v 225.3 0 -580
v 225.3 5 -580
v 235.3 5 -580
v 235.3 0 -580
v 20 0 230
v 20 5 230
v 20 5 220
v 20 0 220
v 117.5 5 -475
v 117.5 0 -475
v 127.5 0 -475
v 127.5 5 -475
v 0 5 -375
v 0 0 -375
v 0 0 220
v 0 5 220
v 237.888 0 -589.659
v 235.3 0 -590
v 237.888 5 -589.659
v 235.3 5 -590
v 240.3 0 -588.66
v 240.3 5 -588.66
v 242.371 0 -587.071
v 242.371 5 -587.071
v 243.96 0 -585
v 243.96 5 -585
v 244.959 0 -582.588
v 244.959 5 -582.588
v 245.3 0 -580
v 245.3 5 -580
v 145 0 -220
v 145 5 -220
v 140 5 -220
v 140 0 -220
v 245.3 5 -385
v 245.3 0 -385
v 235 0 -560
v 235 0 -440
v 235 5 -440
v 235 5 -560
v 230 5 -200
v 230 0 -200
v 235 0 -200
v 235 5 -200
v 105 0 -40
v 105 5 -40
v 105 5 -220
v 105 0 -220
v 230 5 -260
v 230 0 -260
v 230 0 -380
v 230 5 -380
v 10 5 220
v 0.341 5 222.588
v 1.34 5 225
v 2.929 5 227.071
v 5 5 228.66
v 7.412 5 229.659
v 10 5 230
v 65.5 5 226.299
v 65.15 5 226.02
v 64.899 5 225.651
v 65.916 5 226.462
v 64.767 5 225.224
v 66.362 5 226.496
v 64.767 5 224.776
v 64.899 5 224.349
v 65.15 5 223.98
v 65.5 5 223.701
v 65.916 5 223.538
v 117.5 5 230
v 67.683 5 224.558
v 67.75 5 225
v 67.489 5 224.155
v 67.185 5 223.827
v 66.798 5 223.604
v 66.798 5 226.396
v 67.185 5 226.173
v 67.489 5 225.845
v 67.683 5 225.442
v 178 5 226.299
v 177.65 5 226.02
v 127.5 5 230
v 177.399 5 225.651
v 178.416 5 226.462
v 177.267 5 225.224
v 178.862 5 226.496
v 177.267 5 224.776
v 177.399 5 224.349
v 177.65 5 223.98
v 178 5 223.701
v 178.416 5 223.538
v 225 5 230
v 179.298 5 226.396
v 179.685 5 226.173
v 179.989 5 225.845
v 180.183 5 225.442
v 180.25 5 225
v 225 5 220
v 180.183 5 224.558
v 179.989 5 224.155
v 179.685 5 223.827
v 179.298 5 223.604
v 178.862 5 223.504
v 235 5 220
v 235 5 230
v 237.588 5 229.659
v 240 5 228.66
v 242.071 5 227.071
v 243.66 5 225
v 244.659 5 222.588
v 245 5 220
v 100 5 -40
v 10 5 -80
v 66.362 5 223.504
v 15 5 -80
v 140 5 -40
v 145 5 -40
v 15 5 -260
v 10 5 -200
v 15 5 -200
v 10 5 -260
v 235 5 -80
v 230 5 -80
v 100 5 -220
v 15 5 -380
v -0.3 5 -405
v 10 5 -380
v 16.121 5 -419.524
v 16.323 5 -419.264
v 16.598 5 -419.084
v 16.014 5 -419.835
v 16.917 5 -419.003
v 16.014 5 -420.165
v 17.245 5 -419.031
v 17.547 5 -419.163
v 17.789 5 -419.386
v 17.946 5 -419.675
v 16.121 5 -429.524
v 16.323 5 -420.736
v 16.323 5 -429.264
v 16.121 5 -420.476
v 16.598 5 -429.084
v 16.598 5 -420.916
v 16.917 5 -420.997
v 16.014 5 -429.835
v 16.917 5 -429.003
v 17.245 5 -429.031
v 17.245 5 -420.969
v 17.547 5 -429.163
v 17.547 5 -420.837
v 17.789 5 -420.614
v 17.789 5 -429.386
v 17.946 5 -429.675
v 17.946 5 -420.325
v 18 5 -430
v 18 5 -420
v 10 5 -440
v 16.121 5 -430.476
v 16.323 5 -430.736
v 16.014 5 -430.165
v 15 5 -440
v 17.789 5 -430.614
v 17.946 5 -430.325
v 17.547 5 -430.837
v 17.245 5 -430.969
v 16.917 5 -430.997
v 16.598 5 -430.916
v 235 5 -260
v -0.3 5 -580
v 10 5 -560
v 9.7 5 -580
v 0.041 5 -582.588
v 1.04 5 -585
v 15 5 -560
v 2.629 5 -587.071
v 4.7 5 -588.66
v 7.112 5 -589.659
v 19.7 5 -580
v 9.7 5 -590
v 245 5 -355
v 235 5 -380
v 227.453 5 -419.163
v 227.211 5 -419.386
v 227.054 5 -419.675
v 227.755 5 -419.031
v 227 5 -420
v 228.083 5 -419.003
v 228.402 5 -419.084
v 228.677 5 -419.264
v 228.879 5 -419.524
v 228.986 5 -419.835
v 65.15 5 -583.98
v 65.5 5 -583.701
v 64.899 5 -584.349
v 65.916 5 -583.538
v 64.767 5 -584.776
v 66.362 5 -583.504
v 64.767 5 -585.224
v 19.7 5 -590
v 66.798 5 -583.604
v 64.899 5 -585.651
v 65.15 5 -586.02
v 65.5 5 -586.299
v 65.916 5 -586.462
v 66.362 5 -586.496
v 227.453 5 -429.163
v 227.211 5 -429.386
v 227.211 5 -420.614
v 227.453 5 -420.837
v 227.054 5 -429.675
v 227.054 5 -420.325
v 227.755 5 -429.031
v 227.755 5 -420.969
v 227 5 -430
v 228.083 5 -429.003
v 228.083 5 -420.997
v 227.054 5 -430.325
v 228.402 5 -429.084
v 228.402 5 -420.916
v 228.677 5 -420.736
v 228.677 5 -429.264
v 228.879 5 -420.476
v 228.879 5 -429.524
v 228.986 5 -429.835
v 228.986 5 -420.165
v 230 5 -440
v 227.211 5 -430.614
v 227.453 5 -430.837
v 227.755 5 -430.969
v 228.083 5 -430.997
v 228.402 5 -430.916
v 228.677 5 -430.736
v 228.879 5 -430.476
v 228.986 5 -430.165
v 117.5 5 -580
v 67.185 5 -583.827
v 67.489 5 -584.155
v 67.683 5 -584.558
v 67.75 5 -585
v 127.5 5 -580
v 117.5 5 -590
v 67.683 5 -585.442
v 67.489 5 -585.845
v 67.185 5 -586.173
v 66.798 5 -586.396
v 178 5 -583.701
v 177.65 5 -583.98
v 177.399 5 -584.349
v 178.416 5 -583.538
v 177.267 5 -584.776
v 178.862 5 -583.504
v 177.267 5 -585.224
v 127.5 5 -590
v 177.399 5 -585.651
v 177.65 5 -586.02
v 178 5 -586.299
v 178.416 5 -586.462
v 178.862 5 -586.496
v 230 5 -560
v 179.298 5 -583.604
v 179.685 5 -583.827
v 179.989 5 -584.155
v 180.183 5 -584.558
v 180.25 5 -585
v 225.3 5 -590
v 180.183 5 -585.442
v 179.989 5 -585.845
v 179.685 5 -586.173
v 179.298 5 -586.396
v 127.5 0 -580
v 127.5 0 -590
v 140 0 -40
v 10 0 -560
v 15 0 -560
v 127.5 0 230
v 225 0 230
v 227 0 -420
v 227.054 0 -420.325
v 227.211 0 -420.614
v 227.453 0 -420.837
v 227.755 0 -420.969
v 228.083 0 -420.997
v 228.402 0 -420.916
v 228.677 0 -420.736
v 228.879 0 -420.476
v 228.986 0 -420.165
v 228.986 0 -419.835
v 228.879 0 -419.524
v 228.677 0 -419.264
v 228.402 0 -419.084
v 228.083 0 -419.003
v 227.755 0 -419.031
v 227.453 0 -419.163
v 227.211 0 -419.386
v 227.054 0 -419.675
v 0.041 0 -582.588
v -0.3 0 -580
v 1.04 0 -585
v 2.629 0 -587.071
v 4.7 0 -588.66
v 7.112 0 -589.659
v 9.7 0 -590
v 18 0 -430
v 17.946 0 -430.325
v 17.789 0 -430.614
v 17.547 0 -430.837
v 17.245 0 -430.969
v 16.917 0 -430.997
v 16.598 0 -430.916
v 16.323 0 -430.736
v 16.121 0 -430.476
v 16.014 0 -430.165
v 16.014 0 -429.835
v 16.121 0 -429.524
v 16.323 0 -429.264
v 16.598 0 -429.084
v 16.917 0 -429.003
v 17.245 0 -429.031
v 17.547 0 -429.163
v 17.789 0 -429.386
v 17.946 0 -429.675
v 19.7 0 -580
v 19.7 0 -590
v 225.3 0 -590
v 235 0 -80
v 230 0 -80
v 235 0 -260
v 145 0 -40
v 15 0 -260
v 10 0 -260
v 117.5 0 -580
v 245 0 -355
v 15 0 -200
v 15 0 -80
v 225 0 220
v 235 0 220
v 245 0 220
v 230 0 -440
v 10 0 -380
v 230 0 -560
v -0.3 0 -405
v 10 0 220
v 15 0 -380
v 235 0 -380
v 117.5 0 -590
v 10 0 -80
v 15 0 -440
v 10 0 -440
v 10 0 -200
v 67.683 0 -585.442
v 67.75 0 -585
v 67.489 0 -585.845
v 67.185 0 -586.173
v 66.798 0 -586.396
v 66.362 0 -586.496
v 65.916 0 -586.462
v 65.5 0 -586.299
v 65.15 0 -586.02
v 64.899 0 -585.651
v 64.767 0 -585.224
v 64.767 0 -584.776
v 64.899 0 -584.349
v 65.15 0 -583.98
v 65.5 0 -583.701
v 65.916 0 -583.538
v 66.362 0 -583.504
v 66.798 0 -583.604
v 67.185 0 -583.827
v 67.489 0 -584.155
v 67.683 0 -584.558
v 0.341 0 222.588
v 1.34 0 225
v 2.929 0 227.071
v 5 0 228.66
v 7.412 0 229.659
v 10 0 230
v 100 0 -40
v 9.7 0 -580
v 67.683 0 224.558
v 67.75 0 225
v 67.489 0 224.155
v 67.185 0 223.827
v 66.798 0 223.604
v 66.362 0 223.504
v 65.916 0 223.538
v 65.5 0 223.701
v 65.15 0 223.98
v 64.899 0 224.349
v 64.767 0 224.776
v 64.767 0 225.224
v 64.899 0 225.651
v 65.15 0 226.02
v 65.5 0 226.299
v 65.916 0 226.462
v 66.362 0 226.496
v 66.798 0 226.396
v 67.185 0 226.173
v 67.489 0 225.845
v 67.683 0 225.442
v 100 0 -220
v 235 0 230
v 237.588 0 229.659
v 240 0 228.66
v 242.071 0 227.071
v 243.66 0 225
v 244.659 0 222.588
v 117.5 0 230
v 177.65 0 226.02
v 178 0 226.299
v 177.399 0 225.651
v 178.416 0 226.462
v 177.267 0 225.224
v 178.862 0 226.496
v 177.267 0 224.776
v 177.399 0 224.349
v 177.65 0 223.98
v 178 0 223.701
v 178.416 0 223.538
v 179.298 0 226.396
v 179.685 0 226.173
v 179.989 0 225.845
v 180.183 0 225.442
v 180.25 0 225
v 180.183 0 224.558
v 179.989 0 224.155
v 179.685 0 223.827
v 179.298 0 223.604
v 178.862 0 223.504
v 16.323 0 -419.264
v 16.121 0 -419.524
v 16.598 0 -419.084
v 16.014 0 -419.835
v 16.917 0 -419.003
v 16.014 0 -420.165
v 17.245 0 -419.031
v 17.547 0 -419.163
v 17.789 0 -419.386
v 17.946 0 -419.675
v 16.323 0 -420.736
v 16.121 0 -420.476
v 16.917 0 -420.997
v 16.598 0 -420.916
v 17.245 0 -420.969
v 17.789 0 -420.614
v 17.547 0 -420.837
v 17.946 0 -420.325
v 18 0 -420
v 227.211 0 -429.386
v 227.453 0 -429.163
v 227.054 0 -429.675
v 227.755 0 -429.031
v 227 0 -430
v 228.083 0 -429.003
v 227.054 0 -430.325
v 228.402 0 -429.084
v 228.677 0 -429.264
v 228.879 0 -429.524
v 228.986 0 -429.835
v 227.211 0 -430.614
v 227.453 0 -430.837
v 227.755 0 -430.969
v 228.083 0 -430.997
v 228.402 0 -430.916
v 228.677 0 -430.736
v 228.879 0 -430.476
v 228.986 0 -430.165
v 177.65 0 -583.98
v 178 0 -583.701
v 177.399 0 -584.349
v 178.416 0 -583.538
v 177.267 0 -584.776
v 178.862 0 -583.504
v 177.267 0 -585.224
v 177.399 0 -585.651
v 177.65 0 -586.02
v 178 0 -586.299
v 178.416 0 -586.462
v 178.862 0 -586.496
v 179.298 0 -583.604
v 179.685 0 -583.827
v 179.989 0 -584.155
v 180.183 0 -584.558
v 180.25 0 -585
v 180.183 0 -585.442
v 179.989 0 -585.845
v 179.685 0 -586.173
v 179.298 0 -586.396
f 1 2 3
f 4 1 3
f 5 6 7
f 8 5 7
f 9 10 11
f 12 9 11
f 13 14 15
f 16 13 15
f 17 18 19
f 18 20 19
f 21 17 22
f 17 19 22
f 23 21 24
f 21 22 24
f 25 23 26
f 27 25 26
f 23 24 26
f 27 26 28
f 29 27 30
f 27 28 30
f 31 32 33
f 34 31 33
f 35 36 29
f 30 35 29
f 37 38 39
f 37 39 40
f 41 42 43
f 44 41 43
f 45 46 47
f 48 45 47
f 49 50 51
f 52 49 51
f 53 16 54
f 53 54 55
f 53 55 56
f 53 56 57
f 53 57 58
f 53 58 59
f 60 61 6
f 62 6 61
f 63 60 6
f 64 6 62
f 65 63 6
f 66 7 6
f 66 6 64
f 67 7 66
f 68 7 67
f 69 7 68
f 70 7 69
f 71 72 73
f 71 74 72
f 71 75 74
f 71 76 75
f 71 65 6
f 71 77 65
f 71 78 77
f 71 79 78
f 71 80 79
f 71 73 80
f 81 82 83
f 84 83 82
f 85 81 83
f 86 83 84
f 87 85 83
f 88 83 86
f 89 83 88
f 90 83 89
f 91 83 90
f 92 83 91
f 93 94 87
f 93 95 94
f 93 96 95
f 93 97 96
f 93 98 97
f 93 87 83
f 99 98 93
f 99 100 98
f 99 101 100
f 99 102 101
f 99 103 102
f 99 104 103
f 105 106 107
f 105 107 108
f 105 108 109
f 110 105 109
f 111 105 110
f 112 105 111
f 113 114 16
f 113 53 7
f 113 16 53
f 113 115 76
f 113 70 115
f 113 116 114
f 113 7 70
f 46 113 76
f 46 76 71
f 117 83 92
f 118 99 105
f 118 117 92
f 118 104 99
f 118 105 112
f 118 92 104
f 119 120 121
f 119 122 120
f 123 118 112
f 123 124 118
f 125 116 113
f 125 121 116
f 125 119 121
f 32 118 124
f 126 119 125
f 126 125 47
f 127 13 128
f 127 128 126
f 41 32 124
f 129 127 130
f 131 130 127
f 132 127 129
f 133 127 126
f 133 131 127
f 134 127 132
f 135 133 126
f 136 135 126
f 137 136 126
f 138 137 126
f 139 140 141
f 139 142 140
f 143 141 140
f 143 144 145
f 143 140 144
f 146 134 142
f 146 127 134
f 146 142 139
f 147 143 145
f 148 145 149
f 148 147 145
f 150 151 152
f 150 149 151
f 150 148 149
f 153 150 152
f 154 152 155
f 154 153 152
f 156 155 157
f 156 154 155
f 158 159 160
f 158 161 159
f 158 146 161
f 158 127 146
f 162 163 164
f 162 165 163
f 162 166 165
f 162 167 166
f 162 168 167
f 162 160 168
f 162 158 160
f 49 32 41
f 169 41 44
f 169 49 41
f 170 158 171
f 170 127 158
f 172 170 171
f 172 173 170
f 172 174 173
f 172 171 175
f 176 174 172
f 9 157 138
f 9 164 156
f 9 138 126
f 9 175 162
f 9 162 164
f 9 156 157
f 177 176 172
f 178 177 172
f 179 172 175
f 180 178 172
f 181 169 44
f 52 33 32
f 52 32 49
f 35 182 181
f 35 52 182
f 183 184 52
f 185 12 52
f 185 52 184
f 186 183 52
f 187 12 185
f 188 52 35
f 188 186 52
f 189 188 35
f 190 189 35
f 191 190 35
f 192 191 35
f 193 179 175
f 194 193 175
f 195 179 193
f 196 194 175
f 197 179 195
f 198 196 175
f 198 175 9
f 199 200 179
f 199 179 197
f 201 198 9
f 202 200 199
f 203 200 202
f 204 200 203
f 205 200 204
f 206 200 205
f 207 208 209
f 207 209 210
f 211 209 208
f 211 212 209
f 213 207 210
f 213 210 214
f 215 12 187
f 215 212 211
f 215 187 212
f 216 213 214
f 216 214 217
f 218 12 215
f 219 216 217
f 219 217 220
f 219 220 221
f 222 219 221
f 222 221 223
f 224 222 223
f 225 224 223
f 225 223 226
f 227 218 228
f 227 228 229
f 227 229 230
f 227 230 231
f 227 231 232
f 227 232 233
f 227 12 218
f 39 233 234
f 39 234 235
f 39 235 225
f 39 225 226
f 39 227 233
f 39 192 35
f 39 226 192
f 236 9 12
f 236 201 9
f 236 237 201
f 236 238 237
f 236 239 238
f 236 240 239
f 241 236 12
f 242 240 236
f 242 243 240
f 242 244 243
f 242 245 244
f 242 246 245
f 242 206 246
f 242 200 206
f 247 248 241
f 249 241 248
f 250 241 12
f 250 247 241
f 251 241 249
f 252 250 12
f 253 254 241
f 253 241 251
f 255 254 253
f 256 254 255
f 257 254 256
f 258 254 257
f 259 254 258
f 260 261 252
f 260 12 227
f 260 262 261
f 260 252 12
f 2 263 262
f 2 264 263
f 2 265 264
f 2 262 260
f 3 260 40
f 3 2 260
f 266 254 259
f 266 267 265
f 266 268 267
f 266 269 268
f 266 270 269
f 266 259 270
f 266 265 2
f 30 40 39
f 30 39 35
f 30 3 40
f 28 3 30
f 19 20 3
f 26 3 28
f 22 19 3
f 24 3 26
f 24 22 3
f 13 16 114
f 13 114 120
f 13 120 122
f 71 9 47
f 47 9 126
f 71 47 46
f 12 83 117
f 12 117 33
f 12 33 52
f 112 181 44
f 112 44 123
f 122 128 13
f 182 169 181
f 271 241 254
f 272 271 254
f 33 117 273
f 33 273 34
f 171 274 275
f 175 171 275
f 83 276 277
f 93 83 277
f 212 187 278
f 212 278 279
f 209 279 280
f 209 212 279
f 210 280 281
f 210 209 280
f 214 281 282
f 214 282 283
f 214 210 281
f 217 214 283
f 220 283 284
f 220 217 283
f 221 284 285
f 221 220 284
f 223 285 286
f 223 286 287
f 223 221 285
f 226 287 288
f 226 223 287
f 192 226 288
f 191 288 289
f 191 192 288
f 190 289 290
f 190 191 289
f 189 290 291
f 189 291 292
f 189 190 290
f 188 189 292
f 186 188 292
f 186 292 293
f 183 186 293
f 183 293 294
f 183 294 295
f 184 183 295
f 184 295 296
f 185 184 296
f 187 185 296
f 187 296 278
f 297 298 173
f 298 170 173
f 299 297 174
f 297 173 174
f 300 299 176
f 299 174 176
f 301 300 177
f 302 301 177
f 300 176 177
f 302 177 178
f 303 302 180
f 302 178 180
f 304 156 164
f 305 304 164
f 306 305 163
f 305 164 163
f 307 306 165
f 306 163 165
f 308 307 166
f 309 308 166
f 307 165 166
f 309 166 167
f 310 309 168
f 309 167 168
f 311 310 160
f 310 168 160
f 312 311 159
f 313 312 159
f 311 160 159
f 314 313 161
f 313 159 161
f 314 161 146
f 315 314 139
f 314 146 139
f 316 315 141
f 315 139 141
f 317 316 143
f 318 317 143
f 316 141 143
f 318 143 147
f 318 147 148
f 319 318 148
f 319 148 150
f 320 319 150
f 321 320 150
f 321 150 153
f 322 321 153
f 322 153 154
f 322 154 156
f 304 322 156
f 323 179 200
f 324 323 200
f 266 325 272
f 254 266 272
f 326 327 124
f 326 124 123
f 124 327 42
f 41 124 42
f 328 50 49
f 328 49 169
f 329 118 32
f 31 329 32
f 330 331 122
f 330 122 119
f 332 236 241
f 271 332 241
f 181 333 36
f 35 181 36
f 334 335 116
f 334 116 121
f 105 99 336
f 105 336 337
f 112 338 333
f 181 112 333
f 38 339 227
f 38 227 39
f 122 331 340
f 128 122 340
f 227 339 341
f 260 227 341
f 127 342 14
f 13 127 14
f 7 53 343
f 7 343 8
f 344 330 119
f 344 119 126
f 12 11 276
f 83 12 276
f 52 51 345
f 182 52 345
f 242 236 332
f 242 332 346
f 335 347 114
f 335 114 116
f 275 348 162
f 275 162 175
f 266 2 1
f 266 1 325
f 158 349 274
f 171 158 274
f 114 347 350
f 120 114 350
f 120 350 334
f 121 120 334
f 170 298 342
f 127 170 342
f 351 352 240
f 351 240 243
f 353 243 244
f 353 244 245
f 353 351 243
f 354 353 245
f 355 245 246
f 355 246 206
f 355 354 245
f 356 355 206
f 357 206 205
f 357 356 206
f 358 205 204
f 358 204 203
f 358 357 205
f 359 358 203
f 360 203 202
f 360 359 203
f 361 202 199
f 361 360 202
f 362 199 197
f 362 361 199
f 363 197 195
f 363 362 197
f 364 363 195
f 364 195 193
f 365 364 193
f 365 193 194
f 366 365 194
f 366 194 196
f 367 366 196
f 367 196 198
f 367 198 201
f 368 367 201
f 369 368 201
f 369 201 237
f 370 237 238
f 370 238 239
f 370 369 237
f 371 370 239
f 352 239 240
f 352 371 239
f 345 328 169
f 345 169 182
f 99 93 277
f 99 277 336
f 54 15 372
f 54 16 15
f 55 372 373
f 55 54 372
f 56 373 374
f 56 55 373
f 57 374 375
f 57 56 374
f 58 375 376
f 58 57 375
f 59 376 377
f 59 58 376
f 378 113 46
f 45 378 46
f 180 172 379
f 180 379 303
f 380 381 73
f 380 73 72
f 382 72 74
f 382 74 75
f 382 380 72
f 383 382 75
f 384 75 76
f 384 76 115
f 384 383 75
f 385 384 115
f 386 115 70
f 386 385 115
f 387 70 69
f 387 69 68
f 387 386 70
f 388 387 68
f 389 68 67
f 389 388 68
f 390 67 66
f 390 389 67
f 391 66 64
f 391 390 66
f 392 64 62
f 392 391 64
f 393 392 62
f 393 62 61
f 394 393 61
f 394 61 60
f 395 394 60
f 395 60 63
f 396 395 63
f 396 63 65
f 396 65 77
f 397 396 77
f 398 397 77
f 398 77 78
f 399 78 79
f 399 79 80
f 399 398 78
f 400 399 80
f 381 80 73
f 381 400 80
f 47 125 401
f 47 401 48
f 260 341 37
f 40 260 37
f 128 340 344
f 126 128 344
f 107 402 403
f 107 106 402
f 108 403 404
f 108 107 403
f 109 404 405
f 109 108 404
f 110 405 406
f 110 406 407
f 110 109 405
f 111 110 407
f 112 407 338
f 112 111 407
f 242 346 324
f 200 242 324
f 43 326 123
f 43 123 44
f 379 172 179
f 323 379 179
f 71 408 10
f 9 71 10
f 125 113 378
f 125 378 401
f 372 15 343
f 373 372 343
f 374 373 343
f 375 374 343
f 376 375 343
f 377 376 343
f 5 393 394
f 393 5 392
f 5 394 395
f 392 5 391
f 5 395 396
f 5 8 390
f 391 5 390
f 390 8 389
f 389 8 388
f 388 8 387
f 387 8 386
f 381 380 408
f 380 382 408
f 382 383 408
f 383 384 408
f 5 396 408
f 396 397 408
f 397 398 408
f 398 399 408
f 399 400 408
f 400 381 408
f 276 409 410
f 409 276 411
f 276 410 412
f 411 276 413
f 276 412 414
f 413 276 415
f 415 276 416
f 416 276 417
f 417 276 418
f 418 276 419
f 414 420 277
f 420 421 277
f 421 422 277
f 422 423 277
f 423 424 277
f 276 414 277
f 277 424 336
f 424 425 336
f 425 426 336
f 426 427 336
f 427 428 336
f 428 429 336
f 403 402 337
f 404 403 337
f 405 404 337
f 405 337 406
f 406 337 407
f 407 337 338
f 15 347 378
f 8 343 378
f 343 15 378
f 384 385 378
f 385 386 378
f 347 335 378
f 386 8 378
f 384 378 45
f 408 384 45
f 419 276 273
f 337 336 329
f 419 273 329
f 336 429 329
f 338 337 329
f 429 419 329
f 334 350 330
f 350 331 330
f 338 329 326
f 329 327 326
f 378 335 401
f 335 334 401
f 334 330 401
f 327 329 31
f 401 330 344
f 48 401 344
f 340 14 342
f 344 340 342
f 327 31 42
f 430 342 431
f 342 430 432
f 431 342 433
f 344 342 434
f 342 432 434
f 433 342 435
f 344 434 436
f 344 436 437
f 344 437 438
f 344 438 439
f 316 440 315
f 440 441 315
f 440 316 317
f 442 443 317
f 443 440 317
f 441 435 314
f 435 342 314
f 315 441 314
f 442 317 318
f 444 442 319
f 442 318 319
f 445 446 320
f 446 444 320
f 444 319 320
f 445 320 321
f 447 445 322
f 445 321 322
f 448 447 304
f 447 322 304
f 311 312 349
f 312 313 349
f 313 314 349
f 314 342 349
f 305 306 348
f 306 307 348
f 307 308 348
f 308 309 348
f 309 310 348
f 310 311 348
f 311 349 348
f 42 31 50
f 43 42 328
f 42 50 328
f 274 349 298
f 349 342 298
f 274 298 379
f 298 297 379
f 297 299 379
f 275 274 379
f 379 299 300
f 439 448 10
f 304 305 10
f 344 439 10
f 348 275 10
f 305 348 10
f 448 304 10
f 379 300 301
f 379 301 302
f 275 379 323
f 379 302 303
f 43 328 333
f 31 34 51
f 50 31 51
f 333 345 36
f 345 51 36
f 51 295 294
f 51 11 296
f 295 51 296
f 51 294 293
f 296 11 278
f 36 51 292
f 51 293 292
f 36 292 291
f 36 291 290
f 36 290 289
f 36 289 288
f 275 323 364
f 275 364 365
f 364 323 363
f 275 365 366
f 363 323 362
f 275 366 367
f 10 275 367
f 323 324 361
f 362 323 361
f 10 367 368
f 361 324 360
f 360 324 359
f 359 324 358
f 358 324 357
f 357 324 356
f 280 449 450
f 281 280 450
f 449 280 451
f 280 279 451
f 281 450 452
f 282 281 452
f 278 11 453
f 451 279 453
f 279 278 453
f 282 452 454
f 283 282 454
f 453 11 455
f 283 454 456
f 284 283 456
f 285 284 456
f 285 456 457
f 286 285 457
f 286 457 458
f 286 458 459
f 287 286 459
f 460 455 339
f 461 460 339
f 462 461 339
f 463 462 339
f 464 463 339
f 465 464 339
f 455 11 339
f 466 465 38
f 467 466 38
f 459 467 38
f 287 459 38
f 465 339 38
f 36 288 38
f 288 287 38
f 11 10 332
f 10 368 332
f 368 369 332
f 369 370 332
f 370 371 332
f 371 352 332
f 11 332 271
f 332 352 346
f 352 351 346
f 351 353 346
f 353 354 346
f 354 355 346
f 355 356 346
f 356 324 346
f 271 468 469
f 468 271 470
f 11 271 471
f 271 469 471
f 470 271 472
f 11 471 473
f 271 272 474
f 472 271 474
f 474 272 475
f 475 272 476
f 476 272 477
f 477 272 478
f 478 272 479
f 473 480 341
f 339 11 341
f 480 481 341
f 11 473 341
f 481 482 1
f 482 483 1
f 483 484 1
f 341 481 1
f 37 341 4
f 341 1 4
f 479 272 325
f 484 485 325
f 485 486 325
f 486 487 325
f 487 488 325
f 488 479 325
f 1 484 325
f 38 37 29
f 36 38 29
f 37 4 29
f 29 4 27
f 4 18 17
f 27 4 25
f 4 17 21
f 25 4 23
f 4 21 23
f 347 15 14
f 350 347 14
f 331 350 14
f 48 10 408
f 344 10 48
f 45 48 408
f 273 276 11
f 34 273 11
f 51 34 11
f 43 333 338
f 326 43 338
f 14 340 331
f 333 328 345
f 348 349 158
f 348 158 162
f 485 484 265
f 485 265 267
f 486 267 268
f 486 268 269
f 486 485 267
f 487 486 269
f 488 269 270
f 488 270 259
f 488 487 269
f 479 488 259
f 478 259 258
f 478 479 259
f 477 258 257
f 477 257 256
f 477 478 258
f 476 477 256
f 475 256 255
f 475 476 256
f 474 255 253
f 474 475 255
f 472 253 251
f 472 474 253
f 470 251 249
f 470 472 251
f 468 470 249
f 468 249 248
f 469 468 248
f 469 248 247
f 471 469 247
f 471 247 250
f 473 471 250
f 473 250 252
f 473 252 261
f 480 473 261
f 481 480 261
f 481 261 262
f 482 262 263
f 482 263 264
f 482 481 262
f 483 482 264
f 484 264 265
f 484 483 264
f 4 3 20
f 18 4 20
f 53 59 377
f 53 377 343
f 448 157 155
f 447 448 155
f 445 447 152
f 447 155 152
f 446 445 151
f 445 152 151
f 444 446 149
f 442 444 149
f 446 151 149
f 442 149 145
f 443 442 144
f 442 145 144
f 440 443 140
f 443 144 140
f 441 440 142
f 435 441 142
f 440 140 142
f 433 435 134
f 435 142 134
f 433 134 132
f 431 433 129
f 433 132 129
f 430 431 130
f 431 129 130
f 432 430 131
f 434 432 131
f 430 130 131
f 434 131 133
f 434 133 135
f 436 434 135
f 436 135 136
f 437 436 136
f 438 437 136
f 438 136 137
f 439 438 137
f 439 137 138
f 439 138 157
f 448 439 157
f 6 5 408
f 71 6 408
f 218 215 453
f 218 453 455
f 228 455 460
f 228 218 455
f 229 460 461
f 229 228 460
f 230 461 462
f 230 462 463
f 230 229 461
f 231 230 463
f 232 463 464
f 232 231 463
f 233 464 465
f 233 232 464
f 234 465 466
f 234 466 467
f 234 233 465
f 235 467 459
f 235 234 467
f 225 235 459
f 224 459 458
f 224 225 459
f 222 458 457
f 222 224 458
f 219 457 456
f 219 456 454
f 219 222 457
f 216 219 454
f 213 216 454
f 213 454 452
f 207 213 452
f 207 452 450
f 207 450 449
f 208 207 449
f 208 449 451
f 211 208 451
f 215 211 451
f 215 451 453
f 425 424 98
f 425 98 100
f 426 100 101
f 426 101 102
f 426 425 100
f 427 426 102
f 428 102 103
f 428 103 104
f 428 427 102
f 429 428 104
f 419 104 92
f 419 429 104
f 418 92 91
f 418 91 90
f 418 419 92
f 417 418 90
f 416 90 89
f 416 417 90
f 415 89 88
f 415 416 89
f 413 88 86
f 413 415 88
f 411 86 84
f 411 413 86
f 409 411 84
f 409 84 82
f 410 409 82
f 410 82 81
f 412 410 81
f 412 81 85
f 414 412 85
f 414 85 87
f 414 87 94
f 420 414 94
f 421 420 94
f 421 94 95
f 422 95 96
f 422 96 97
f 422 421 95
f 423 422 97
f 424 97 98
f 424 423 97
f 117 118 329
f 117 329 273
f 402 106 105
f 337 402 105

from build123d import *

# Parameters (mm, degrees)
SKETCH2_R           = 1.5
SKETCH2_W           = 5
SKETCH2_H           = 120
BOSS_EXTRUDE1_DEPTH = 5
SKETCH3_R           = 1
SKETCH3_W           = 5
SKETCH3_H           = 180
CUT_EXTRUDE1_DEPTH  = 5
FILLET1_R           = 10
SKETCH4_W           = 10
SKETCH4_H           = 10
CUT_EXTRUDE2_DEPTH  = 10


with BuildPart() as part:
    # Sketch2 → Boss-Extrude1 (new body)
    with BuildSketch(Plane(origin=(0, 0, 0), x_dir=(1, 0, 0), z_dir=(0, 1, 0))):
        Polygon((0, 375), (0, 0), (0, -230), (10, -230), (15, -230), (117.5, -230), (117.5, 475), (127.5, 475), (127.5, -230), (230, -230), (235, -230), (245, -230), (245, -10), (245, 355), (245.3, 385), (245.3, 590), (245, 590), (0, 590), (-0.3, 590), (-0.3, 405), align=None)
        with Locations((66.25, -225)):
            Circle(SKETCH2_R, mode=Mode.SUBTRACT)
        with Locations((12.5, 140)):
            Rectangle(SKETCH2_W, SKETCH2_H, mode=Mode.SUBTRACT)
        with Locations((178.75, -225)):
            Circle(SKETCH2_R, mode=Mode.SUBTRACT)
        with Locations((232.5, 140)):
            Rectangle(SKETCH2_W, SKETCH2_H, mode=Mode.SUBTRACT)
        with Locations((12.5, 320)):
            Rectangle(SKETCH2_W, SKETCH2_H, mode=Mode.SUBTRACT)
        with Locations((12.5, 500)):
            Rectangle(SKETCH2_W, SKETCH2_H, mode=Mode.SUBTRACT)
        with Locations((66.25, 585)):
            Circle(SKETCH2_R, mode=Mode.SUBTRACT)
        with Locations((232.5, 320)):
            Rectangle(SKETCH2_W, SKETCH2_H, mode=Mode.SUBTRACT)
        with Locations((178.75, 585)):
            Circle(SKETCH2_R, mode=Mode.SUBTRACT)
        with Locations((232.5, 500)):
            Rectangle(SKETCH2_W, SKETCH2_H, mode=Mode.SUBTRACT)
    extrude(amount=BOSS_EXTRUDE1_DEPTH)

    # Sketch3 → Cut-Extrude1 (cut)
    with BuildSketch(Plane(origin=(0, 5, 0), x_dir=(1, 0, 0), z_dir=(0, 1, 0))):
        with Locations((17, 420)):
            Circle(SKETCH3_R)
        with Locations((17, 430)):
            Circle(SKETCH3_R)
        with Locations((102.5, 130)):
            Rectangle(SKETCH3_W, SKETCH3_H)
    cut_extrude1 = extrude(amount=-CUT_EXTRUDE1_DEPTH, mode=Mode.SUBTRACT)

    # Mirror1: Cut-Extrude1 across plane
    add(cut_extrude1.mirror(Plane.ZY.offset(-122.5)), mode=Mode.SUBTRACT)

    # Fillet1
    fillet1_edges = [part.edges().sort_by_distance(p)[0] for p in [
        (245, 2.5, 230),
        (0, 2.5, 230),
        (-0.3, 2.5, -590),
        (245.3, 2.5, -590),
    ]]
    fillet(fillet1_edges, radius=FILLET1_R)

    # Sketch4 → Cut-Extrude2 (cut)
    with BuildSketch(Plane(origin=(0, 5, 0), x_dir=(1, 0, 0), z_dir=(0, 1, 0))):
        with Locations((15, -225)):
            Rectangle(SKETCH4_W, SKETCH4_H)
        with Locations((230, -225)):
            Rectangle(SKETCH4_W, SKETCH4_H)
        with Locations((14.7, 585)):
            Rectangle(SKETCH4_W, SKETCH4_H)
        with Locations((230.3, 585)):
            Rectangle(SKETCH4_W, SKETCH4_H)
        with Locations((122.5, 585)):
            Rectangle(SKETCH4_W, SKETCH4_H)
    extrude(amount=-CUT_EXTRUDE2_DEPTH, mode=Mode.SUBTRACT)


solid = part.part
